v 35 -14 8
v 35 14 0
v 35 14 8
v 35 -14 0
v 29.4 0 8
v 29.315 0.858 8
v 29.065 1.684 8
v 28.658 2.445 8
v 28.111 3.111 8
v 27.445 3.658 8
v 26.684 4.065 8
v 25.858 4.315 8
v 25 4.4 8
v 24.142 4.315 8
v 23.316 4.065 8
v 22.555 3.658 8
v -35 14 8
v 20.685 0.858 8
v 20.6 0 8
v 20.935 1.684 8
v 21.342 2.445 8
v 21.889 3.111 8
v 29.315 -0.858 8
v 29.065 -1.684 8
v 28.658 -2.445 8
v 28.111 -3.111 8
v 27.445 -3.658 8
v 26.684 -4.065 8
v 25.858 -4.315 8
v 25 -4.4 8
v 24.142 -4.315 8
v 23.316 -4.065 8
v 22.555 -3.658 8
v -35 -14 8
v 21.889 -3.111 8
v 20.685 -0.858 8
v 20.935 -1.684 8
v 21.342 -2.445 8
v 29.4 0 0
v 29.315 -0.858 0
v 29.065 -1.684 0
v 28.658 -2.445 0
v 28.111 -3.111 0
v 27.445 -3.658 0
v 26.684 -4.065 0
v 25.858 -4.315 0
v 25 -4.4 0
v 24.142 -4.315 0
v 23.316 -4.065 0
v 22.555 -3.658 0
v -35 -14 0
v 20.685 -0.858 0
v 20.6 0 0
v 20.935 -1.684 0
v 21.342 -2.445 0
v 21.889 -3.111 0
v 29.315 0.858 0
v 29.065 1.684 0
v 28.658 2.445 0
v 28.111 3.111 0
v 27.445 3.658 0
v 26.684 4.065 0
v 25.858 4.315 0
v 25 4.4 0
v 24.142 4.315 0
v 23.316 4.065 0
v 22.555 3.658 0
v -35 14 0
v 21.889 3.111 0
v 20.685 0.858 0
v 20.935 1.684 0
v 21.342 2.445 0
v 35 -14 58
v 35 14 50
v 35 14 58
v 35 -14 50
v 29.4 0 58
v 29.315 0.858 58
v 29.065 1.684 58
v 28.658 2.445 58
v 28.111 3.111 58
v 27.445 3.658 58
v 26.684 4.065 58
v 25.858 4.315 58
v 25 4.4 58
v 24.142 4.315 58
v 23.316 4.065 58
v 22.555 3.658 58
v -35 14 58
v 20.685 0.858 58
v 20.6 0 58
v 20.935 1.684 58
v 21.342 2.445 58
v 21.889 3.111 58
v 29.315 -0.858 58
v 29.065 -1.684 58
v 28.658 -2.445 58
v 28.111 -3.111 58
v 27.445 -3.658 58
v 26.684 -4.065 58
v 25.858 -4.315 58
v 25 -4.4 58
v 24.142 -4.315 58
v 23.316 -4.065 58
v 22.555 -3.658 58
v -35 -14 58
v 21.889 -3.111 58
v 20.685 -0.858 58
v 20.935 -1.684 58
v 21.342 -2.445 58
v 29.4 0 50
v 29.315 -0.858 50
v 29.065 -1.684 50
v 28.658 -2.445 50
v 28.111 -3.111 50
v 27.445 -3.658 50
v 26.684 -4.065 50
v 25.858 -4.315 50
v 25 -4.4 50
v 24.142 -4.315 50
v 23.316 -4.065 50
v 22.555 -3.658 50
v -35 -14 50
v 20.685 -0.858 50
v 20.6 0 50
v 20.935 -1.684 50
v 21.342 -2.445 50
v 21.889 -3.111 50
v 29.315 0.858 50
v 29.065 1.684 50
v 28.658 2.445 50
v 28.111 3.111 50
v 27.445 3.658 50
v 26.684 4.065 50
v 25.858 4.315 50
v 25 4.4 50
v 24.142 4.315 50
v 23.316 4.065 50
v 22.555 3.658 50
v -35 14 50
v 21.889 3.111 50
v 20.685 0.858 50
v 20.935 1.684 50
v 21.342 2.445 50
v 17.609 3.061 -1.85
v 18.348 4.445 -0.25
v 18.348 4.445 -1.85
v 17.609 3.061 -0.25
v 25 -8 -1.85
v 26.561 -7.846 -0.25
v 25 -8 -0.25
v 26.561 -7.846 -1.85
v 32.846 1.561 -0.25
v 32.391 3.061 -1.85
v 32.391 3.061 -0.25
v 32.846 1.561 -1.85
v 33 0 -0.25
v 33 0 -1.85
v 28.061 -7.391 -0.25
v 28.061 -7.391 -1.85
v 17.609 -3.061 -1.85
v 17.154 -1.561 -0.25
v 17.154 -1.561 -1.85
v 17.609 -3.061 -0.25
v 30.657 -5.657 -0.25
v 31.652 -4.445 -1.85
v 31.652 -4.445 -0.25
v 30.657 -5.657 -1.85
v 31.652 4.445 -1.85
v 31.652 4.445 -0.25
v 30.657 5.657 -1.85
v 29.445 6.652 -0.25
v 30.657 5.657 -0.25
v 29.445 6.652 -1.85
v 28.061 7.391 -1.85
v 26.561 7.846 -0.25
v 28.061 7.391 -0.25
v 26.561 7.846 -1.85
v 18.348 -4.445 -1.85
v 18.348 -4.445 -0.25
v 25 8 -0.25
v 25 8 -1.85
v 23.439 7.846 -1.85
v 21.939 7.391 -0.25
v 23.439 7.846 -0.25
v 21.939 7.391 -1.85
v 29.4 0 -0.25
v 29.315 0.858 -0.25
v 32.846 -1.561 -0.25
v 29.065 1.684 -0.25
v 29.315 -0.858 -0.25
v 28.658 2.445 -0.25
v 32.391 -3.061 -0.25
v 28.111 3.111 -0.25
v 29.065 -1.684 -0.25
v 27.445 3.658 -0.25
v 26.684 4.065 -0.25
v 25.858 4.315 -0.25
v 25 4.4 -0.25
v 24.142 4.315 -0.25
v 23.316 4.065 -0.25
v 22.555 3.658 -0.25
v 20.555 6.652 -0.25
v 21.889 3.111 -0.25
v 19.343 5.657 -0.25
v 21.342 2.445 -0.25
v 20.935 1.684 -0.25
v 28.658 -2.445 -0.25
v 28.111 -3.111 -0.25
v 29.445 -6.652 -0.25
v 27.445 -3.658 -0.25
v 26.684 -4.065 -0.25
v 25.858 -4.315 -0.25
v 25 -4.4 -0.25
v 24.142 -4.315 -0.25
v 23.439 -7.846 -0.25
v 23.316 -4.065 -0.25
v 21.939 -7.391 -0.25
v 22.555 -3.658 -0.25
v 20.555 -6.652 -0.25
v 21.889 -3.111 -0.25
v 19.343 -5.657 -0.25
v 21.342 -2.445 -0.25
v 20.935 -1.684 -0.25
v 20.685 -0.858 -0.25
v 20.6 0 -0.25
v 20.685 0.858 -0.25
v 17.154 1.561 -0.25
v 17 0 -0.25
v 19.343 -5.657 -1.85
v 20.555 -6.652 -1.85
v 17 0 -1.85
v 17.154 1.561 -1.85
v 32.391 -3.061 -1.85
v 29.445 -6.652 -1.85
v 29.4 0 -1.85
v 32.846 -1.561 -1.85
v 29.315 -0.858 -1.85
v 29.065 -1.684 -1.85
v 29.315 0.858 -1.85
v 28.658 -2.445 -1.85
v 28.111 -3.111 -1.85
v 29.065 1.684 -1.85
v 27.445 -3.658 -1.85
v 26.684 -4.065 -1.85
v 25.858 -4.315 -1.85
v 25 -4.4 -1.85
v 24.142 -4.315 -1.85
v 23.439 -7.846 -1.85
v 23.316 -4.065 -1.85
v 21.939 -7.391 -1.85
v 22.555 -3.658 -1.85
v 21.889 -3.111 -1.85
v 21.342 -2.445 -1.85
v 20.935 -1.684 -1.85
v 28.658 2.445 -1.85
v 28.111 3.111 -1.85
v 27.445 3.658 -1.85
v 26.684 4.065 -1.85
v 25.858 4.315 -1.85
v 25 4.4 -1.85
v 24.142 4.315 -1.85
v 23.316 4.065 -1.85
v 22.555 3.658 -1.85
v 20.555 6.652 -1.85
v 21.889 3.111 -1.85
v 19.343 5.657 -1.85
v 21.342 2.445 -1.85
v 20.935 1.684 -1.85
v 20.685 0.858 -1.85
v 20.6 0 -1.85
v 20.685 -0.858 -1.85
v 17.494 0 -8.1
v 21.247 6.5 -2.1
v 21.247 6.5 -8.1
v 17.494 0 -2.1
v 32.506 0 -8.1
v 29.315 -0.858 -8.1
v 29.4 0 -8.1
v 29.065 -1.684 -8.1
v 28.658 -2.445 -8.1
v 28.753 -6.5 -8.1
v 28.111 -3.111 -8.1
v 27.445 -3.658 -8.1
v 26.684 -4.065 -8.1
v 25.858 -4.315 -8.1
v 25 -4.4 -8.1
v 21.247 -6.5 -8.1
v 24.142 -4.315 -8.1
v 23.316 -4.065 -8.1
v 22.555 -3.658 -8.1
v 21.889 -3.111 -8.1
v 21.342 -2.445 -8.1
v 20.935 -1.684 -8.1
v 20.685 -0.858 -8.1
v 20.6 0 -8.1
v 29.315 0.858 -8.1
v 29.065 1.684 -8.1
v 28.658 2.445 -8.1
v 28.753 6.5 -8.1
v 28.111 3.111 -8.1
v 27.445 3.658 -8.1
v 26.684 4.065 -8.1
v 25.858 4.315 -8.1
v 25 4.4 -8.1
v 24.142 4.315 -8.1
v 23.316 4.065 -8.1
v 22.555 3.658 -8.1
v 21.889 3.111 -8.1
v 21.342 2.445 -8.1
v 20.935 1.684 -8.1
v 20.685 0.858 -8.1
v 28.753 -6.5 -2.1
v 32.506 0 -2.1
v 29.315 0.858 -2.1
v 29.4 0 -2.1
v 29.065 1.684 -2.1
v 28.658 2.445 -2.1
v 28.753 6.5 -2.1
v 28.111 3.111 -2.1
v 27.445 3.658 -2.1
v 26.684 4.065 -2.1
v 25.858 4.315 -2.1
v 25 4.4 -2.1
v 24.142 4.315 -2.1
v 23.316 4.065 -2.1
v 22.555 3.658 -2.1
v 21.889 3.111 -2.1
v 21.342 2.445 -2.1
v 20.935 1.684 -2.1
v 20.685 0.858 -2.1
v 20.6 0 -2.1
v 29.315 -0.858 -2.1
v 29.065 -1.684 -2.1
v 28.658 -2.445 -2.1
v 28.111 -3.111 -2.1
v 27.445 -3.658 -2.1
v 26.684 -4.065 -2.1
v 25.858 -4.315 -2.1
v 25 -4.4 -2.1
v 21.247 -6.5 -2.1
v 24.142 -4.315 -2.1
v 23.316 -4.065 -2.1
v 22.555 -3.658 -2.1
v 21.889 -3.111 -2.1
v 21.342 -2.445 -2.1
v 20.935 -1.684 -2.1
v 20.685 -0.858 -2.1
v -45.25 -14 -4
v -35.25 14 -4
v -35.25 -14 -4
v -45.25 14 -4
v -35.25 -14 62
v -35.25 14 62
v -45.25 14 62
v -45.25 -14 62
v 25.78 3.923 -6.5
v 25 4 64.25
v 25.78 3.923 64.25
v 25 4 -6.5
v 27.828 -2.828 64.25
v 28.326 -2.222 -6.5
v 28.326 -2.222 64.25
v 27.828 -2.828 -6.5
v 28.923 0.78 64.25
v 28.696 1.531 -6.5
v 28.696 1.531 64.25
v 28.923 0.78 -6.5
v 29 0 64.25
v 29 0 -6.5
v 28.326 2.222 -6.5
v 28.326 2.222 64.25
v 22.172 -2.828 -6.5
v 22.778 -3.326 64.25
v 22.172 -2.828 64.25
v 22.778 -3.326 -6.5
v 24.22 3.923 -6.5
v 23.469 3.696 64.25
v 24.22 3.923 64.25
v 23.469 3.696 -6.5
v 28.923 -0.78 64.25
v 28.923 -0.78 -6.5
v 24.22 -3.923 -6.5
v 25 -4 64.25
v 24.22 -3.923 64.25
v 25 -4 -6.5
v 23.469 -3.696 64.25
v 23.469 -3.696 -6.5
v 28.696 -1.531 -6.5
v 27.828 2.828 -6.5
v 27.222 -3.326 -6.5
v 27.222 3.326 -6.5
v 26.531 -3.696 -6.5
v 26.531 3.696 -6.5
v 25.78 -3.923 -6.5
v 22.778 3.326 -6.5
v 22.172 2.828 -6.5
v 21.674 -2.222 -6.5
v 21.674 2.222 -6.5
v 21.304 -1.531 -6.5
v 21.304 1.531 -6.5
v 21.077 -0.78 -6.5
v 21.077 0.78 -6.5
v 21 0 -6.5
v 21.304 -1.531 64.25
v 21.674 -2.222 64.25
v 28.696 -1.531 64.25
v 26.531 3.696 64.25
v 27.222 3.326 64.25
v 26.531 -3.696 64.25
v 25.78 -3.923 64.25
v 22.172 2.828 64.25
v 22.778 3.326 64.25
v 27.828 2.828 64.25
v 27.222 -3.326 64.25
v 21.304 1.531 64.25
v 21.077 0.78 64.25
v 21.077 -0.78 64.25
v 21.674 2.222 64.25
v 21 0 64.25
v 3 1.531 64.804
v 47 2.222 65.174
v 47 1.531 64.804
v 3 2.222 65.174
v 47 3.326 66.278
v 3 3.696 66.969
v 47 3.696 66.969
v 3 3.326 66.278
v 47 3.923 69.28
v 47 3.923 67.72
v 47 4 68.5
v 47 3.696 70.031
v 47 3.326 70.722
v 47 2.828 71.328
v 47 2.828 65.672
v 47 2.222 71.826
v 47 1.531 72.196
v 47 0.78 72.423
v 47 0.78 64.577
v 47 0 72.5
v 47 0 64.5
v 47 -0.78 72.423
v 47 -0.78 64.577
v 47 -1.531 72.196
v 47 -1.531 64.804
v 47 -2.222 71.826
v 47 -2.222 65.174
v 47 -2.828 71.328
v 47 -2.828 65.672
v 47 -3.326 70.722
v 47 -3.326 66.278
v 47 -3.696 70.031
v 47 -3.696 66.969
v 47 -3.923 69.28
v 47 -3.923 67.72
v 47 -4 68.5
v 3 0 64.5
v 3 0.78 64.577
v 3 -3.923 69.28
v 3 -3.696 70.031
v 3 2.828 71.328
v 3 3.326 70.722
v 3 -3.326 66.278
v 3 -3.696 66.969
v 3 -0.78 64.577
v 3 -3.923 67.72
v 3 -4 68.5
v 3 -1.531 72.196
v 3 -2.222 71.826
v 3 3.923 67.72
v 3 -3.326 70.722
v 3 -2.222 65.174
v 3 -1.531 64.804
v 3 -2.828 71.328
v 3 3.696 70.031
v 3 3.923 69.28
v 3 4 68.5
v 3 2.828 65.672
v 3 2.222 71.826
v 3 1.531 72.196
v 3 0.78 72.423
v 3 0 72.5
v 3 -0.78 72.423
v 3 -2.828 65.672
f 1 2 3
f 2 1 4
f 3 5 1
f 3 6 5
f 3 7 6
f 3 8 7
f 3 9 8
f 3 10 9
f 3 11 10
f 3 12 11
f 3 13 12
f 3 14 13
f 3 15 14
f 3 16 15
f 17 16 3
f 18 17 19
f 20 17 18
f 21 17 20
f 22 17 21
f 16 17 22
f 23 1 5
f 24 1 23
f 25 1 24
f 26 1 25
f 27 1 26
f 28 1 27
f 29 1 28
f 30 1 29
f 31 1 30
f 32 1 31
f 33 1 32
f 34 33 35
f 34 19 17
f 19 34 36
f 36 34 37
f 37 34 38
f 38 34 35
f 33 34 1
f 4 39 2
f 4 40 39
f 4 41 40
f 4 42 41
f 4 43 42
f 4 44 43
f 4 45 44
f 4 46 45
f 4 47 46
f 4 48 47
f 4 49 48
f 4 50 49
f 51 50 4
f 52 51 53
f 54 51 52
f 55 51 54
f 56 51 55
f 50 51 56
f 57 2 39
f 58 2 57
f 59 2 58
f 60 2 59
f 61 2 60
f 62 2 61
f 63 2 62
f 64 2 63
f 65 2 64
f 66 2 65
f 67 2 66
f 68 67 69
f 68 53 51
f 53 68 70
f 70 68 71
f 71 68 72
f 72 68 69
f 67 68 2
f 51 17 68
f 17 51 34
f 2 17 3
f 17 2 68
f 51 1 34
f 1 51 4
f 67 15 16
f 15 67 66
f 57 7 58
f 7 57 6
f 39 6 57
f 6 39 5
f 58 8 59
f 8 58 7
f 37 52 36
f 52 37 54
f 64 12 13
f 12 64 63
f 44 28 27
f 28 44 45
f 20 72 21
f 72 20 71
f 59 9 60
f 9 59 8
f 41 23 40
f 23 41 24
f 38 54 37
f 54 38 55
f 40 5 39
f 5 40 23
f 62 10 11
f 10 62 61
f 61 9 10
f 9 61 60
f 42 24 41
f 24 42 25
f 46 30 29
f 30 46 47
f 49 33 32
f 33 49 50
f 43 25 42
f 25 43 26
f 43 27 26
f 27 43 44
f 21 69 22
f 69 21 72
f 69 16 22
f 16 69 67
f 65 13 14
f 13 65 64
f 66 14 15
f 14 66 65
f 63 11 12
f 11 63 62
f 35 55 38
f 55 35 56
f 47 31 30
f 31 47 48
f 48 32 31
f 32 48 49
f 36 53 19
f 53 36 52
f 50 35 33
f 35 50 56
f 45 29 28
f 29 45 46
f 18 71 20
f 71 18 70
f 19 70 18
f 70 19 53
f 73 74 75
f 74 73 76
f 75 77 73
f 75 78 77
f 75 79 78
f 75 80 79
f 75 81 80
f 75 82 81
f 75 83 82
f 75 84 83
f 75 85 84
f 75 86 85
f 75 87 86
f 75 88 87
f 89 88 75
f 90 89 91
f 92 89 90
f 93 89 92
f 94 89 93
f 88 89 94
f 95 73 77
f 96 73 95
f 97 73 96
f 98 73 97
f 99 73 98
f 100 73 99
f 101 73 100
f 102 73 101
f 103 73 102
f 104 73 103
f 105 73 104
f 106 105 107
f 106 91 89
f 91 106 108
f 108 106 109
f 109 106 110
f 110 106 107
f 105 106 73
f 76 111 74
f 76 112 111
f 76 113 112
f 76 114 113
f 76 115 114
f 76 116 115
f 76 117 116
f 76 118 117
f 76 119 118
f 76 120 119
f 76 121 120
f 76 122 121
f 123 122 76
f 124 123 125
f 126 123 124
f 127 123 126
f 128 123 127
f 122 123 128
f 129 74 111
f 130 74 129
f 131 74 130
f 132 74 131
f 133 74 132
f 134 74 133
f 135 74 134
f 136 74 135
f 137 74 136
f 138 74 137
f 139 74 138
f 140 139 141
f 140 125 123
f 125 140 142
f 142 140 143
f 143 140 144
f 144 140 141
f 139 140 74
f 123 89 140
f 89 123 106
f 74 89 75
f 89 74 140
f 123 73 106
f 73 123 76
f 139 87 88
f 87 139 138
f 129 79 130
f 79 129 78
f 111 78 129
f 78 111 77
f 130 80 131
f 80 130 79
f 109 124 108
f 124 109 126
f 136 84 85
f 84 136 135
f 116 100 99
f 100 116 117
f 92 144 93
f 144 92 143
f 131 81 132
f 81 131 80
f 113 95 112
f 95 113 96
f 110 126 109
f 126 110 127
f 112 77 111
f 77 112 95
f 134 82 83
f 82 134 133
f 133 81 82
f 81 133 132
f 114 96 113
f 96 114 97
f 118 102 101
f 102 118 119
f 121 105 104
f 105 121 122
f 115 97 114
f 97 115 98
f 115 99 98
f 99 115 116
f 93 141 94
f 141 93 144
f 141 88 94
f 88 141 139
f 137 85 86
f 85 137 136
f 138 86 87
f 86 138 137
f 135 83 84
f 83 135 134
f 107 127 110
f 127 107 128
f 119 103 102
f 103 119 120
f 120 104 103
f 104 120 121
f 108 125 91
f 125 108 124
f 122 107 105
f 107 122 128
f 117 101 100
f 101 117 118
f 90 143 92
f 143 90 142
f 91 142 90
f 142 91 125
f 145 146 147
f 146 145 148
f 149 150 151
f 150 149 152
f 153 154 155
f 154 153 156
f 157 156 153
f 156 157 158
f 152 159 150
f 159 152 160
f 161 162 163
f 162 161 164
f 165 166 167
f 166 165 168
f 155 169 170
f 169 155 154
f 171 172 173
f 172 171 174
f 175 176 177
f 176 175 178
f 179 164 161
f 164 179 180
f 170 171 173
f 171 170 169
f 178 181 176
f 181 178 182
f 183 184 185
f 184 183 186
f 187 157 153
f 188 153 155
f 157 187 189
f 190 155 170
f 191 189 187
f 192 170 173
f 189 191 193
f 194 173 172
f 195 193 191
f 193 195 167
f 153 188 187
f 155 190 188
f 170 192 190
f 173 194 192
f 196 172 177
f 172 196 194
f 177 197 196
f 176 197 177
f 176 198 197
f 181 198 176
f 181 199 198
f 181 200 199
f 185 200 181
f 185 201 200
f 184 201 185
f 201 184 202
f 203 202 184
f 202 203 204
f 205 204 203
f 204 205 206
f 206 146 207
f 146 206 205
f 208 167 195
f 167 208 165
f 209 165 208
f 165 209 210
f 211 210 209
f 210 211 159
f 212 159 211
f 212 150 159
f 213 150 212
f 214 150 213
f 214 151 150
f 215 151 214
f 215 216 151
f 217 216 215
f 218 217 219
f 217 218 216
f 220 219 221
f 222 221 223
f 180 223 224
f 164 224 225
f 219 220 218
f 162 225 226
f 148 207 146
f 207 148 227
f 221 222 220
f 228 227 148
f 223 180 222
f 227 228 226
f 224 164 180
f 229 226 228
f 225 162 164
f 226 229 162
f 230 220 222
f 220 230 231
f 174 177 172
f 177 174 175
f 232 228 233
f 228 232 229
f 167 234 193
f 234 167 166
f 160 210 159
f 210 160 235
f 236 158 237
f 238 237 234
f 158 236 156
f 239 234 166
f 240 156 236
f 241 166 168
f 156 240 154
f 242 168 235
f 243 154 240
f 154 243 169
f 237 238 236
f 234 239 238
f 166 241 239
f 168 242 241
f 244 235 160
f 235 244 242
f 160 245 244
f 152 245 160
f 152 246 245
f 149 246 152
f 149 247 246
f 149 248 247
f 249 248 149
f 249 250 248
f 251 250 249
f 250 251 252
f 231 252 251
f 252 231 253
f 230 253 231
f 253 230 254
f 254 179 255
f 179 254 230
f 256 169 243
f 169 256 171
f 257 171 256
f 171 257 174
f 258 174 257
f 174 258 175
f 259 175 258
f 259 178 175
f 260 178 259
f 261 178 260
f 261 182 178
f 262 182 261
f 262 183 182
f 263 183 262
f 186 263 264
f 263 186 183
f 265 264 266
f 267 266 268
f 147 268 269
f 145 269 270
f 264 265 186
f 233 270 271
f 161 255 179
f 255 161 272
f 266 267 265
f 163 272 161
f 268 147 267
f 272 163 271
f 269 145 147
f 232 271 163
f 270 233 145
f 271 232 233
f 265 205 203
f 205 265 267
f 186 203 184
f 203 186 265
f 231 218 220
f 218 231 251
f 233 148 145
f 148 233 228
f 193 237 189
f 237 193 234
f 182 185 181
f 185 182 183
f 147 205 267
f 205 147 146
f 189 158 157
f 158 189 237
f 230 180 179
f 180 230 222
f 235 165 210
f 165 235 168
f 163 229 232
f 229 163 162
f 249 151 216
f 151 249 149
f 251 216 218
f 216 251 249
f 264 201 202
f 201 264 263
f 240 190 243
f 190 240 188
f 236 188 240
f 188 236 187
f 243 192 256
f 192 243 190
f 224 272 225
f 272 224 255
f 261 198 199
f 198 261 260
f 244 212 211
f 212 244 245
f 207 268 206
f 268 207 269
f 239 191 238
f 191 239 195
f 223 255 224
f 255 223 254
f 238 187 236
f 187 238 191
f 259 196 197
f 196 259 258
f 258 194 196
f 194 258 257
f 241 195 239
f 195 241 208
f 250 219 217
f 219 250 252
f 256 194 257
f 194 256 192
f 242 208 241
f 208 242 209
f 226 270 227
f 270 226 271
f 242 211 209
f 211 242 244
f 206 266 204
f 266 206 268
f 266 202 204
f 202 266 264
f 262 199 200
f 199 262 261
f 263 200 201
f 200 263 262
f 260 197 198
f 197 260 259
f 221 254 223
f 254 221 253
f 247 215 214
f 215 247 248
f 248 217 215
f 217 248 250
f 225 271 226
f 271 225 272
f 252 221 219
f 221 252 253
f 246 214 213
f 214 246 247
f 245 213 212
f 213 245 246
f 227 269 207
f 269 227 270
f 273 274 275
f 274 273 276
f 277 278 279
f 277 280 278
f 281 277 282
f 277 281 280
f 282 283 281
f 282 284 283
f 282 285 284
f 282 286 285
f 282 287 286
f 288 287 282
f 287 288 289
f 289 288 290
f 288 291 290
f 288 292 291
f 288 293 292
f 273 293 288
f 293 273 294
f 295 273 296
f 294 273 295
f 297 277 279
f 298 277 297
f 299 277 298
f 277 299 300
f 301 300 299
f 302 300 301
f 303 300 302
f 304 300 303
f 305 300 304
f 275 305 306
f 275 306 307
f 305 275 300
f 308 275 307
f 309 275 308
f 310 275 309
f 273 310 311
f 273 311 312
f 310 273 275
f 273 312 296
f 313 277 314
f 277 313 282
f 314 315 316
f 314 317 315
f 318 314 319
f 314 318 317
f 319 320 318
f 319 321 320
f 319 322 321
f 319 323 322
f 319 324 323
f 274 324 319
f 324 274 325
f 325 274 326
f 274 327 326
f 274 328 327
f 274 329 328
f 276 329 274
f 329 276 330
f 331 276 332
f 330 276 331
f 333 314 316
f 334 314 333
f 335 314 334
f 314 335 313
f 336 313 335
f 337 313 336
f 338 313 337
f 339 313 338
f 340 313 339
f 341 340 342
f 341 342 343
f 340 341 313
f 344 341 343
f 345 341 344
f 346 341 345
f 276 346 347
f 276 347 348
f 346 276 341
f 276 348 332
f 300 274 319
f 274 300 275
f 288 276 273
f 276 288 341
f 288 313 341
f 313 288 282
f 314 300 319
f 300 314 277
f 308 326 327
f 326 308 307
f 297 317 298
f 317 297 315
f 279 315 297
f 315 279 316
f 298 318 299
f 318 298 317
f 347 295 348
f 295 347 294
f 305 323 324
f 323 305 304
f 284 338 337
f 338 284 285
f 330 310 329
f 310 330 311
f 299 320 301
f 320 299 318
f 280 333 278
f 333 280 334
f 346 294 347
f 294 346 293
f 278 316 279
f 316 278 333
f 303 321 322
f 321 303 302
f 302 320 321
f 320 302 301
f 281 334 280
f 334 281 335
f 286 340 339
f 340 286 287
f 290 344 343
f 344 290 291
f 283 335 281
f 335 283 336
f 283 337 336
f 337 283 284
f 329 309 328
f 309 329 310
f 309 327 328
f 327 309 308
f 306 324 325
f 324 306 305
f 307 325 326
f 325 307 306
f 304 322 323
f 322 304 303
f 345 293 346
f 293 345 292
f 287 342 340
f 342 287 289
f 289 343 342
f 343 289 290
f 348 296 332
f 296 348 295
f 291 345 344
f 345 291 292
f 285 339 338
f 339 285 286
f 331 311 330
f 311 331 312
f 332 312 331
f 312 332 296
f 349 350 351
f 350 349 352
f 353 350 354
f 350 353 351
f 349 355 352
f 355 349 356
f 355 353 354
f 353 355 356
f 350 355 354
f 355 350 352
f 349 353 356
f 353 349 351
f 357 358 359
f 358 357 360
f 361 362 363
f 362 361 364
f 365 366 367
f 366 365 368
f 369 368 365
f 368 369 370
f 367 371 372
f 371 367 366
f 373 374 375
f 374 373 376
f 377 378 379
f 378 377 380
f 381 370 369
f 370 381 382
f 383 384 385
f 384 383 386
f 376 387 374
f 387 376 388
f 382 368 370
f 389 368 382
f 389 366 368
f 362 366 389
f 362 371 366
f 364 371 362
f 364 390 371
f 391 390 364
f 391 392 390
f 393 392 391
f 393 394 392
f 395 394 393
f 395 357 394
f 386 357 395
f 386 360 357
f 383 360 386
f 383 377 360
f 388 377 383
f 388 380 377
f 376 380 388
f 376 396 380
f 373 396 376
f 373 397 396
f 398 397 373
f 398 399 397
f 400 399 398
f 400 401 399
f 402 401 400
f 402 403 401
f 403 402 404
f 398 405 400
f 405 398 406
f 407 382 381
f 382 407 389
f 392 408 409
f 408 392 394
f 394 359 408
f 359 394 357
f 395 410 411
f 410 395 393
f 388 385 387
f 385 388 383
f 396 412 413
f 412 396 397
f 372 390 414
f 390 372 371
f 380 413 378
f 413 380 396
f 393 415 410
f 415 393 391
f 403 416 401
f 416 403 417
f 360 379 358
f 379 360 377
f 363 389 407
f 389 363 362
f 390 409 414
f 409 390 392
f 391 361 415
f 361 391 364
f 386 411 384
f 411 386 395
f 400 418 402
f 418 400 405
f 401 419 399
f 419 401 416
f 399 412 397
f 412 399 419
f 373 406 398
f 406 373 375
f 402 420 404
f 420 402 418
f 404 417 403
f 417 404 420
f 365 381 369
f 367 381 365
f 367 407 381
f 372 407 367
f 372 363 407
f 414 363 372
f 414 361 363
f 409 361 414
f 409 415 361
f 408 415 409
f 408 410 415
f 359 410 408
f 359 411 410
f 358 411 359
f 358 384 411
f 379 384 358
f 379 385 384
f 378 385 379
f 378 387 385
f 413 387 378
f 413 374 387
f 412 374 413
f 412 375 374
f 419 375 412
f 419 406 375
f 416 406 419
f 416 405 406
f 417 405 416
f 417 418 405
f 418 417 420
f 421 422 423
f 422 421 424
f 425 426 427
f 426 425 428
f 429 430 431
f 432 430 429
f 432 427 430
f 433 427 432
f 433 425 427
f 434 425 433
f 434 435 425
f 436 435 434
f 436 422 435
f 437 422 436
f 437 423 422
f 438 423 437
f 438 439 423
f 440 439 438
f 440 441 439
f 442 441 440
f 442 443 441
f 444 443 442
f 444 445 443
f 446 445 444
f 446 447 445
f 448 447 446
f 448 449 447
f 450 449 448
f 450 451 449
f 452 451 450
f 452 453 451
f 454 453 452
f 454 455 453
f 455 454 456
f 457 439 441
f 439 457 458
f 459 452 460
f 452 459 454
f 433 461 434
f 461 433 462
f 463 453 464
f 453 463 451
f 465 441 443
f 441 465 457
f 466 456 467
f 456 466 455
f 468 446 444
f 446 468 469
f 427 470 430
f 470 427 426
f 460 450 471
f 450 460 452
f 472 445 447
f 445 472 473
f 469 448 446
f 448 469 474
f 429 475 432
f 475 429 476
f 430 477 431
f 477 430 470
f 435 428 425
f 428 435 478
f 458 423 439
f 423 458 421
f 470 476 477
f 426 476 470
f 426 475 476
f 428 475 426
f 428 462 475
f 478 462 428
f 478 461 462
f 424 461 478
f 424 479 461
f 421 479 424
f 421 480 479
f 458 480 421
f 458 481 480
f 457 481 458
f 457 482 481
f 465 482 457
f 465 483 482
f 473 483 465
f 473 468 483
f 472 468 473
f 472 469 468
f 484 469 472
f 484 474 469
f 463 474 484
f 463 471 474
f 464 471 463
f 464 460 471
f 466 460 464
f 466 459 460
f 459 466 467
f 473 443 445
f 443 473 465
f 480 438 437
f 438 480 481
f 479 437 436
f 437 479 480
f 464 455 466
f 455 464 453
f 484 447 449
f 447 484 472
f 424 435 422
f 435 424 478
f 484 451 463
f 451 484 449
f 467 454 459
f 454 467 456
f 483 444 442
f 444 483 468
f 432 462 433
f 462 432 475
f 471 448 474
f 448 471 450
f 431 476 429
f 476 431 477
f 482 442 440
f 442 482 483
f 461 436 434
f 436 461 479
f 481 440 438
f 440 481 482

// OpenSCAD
$fn = 32;

// ------------------------------------------------------------------------
// C clamp: throat 50 mm, screw d8
// Every part is its own module, assembly() places every instance.
// ------------------------------------------------------------------------

// --- part 1 ---
module clamp_arm() {
  difference() {
    translate([-35, -14, 0]) cube([70, 28, 8]);
    translate([25, 0, -1]) cylinder(h = 10, d = 8.8);
  }
}

// --- part 2 ---
module clamp_spine() {
  difference() {
    translate([-33, -14, 0]) cube([66, 28, 10]);
  }
}

// --- part 3 ---
module clamp_screw() {
  translate([0, 0, -35.375]) cylinder(h = 70.75, d = 8);
}

// --- part 4 ---
module clamp_washer() {
  difference() {
      translate([0, 0, 0]) cylinder(h = 1.6, d = 16);
      translate([0, 0, -1]) cylinder(h = 3.6, d = 8.8);
    }
}

// --- part 5 ---
module clamp_nut() {
  difference() {
    linear_extrude(height = 6) polygon(points = [[7.506, 0], [3.753, 6.5], [-3.753, 6.5], [-7.506, 0], [-3.753, -6.5], [3.753, -6.5]]);
    translate([0, 0, -1]) cylinder(h = 8, d = 8.8);
  }
}

// --- part 6 ---
module tommy_bar() {
  translate([0, 0, -22]) cylinder(h = 44, d = 8);
}

// --- assembly ---
module assembly() {
  color([0.80, 0.24, 0.20]) translate([0, 0, 0]) rotate([0, 0, 0]) clamp_arm();
  color([0.20, 0.45, 0.75]) translate([0, 0, 50]) rotate([0, 0, 0]) clamp_arm();
  color([0.25, 0.62, 0.32]) translate([-45.25, 0, 29]) rotate([0, 90, 0]) clamp_spine();
  color([0.92, 0.70, 0.18]) translate([25, 0, 28.875]) rotate([0, 0, 0]) clamp_screw();
  color([0.58, 0.35, 0.70]) translate([25, 0, -1.85]) rotate([0, 0, 0]) clamp_washer();
  color([0.16, 0.66, 0.66]) translate([25, 0, -8.1]) rotate([0, 0, 0]) clamp_nut();
  color([0.85, 0.48, 0.18]) translate([25, 0, 68.5]) rotate([0, 90, 0]) tommy_bar();
}

assembly();
